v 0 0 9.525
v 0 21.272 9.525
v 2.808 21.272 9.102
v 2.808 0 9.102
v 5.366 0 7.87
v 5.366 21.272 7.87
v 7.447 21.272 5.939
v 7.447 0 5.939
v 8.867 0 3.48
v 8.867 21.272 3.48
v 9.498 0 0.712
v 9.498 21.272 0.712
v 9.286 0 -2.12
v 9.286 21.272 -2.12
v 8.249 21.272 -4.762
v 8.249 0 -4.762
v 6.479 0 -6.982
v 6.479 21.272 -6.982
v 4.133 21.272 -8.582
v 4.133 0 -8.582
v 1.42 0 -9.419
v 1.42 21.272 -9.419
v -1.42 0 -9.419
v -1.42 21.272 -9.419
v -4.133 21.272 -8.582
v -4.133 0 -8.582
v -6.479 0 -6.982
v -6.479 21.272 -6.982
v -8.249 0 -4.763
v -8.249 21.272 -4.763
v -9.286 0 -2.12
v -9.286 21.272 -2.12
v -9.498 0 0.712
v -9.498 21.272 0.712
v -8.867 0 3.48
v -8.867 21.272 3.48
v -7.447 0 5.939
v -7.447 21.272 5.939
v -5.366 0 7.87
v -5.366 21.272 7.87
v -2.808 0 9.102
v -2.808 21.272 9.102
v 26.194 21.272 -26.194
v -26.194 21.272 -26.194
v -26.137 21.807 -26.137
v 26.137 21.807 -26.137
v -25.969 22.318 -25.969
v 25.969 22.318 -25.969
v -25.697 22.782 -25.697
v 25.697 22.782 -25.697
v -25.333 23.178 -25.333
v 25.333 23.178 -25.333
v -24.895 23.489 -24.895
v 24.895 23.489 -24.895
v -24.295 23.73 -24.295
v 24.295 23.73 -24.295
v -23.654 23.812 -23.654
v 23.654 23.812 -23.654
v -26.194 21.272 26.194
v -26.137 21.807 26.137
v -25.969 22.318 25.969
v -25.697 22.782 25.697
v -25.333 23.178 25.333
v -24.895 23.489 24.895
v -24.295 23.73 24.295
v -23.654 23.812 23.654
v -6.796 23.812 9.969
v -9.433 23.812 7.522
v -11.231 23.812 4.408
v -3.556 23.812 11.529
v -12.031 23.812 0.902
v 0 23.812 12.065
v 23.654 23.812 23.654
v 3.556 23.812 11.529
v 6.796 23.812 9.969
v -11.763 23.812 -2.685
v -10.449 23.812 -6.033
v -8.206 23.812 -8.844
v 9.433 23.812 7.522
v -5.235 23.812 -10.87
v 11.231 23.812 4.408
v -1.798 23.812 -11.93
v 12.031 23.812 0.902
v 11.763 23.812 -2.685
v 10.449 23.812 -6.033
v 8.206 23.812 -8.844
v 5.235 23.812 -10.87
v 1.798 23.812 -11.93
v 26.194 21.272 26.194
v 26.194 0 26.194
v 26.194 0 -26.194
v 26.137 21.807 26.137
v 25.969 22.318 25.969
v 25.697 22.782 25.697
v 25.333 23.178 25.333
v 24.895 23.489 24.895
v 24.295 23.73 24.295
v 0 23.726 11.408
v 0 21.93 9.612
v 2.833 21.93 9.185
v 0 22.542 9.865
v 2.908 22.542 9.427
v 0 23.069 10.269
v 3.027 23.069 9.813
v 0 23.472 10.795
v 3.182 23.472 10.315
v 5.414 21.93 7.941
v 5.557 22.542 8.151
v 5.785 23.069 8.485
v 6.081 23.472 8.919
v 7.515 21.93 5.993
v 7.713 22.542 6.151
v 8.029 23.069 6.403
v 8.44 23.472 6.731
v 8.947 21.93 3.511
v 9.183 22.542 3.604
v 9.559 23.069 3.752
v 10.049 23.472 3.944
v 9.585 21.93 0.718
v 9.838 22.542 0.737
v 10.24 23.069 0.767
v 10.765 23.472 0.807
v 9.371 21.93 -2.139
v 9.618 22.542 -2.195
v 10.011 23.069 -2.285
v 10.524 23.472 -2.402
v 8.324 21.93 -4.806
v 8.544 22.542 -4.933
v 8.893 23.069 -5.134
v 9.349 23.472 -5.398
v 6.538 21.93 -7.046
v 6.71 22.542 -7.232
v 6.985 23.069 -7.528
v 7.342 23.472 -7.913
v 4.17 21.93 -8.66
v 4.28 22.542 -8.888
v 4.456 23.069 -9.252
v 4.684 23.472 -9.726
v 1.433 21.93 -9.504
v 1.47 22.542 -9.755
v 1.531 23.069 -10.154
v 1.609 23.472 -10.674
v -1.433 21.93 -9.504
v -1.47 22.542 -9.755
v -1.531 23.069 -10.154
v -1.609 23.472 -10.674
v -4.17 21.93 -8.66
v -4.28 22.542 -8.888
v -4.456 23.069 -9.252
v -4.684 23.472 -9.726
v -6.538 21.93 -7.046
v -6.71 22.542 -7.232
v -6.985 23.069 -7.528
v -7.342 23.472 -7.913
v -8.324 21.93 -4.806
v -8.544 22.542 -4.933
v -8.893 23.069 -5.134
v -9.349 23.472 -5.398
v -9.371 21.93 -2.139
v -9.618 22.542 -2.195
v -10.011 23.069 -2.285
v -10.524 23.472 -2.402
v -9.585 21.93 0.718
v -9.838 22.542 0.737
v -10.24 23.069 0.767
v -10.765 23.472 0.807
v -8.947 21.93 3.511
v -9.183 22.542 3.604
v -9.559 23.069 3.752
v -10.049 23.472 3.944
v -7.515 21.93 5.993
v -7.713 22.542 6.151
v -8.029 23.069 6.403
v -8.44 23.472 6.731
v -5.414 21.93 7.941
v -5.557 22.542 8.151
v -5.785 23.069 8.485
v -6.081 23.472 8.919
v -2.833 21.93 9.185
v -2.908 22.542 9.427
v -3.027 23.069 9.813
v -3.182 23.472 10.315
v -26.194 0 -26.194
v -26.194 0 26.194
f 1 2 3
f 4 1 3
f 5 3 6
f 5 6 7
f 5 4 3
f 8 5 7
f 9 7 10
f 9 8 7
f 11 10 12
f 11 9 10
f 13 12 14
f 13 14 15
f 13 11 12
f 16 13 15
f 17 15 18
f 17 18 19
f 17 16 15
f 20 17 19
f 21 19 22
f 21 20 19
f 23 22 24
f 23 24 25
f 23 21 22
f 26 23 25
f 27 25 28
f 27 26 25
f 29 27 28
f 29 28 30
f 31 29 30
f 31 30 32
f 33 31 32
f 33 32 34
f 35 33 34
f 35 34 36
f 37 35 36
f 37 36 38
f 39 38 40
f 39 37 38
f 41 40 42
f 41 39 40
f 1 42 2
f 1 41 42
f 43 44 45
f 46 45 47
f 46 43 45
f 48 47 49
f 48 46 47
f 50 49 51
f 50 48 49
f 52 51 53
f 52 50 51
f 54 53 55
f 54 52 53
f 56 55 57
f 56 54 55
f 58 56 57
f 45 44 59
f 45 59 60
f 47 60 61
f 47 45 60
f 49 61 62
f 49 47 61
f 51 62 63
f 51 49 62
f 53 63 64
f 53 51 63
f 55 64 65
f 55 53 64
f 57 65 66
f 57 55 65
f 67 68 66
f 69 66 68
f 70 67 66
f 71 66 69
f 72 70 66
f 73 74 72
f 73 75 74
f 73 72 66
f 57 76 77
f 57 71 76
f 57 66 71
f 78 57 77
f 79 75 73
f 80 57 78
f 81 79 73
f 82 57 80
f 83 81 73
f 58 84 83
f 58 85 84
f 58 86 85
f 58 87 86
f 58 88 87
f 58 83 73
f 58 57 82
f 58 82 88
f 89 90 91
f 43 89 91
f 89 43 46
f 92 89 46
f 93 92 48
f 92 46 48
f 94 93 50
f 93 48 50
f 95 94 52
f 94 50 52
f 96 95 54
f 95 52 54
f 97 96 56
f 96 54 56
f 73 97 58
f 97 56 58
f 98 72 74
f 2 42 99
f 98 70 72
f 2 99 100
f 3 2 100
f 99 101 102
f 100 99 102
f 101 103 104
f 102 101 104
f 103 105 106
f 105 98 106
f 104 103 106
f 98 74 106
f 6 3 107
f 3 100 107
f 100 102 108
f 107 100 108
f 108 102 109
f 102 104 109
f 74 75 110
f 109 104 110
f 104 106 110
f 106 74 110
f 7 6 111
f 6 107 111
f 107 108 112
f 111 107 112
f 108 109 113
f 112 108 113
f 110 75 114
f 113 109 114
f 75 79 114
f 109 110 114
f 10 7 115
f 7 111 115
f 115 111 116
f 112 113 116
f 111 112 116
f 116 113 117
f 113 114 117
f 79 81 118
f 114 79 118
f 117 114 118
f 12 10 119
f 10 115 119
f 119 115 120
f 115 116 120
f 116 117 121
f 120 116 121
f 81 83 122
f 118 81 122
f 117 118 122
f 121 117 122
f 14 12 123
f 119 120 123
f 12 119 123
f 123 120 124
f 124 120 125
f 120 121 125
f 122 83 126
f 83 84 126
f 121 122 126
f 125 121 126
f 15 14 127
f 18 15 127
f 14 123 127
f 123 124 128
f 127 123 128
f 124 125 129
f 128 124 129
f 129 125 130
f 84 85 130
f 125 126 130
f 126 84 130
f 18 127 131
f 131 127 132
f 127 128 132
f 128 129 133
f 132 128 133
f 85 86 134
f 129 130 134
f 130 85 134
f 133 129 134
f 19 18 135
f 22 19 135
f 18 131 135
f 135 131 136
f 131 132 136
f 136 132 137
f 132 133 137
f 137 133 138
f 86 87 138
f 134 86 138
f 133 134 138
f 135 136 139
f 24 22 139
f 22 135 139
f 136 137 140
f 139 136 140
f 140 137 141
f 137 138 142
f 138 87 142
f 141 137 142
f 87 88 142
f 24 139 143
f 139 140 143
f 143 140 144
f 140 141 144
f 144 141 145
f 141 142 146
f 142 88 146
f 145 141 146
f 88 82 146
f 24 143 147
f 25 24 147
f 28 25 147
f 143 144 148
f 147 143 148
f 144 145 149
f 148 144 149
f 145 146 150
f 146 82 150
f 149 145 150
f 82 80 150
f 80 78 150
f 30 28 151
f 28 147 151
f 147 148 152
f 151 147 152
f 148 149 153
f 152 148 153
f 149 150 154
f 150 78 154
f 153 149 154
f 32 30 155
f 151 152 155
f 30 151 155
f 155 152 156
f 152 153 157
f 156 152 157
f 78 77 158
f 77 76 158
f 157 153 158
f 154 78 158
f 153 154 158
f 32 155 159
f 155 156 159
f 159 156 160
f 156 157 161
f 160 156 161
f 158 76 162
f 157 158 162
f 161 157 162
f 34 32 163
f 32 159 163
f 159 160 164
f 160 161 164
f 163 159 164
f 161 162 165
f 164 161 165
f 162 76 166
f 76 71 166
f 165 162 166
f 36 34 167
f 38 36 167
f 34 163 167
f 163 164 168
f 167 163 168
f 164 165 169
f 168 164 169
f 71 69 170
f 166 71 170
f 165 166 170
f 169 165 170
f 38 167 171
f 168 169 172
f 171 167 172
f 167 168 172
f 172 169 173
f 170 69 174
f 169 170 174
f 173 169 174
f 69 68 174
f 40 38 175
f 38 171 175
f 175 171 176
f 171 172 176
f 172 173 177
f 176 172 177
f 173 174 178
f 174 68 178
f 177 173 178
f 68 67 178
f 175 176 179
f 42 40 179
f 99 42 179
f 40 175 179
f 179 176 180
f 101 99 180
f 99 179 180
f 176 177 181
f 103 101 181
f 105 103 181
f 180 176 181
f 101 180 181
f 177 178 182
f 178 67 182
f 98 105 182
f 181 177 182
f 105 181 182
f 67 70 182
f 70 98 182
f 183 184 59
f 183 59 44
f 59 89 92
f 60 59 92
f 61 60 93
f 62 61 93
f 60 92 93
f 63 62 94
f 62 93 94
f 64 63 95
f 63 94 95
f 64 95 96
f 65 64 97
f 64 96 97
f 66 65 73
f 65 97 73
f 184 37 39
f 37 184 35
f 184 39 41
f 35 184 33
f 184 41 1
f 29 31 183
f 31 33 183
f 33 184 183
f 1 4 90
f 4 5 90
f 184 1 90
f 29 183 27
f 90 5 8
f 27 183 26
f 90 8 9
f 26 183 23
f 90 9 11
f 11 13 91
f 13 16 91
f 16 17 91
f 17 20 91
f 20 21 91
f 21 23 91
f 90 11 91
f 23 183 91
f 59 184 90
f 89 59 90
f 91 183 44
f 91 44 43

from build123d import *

# Parameters (mm, degrees)
SKETCH1_W           = 52.3875
SKETCH1_H           = 52.3875
SKETCH1_R           = 9.525
BOSS_EXTRUDE1_DEPTH = 23.8125
FILLET1_R           = 2.54


with BuildPart() as part:
    # Sketch1 → Boss-Extrude1 (new body)
    with BuildSketch(Plane(origin=(0, 0, 0), x_dir=(1, 0, 0), z_dir=(0, 1, 0))):
        Rectangle(SKETCH1_W, SKETCH1_H)
        with Locations(Location((0, 0, 0), (0, 0, 270))):
            Circle(SKETCH1_R, mode=Mode.SUBTRACT)
    extrude(amount=BOSS_EXTRUDE1_DEPTH)

    # Fillet1
    fillet1_edges = [part.edges().sort_by_distance(p)[0] for p in [
        (26.19375, 23.8125, 0),
        (0, 23.8125, -9.525),
        (0, 23.8125, -26.19375),
        (-26.19375, 23.8125, 0),
        (0, 23.8125, 26.19375),
    ]]
    fillet(fillet1_edges, radius=FILLET1_R)


solid = part.part
